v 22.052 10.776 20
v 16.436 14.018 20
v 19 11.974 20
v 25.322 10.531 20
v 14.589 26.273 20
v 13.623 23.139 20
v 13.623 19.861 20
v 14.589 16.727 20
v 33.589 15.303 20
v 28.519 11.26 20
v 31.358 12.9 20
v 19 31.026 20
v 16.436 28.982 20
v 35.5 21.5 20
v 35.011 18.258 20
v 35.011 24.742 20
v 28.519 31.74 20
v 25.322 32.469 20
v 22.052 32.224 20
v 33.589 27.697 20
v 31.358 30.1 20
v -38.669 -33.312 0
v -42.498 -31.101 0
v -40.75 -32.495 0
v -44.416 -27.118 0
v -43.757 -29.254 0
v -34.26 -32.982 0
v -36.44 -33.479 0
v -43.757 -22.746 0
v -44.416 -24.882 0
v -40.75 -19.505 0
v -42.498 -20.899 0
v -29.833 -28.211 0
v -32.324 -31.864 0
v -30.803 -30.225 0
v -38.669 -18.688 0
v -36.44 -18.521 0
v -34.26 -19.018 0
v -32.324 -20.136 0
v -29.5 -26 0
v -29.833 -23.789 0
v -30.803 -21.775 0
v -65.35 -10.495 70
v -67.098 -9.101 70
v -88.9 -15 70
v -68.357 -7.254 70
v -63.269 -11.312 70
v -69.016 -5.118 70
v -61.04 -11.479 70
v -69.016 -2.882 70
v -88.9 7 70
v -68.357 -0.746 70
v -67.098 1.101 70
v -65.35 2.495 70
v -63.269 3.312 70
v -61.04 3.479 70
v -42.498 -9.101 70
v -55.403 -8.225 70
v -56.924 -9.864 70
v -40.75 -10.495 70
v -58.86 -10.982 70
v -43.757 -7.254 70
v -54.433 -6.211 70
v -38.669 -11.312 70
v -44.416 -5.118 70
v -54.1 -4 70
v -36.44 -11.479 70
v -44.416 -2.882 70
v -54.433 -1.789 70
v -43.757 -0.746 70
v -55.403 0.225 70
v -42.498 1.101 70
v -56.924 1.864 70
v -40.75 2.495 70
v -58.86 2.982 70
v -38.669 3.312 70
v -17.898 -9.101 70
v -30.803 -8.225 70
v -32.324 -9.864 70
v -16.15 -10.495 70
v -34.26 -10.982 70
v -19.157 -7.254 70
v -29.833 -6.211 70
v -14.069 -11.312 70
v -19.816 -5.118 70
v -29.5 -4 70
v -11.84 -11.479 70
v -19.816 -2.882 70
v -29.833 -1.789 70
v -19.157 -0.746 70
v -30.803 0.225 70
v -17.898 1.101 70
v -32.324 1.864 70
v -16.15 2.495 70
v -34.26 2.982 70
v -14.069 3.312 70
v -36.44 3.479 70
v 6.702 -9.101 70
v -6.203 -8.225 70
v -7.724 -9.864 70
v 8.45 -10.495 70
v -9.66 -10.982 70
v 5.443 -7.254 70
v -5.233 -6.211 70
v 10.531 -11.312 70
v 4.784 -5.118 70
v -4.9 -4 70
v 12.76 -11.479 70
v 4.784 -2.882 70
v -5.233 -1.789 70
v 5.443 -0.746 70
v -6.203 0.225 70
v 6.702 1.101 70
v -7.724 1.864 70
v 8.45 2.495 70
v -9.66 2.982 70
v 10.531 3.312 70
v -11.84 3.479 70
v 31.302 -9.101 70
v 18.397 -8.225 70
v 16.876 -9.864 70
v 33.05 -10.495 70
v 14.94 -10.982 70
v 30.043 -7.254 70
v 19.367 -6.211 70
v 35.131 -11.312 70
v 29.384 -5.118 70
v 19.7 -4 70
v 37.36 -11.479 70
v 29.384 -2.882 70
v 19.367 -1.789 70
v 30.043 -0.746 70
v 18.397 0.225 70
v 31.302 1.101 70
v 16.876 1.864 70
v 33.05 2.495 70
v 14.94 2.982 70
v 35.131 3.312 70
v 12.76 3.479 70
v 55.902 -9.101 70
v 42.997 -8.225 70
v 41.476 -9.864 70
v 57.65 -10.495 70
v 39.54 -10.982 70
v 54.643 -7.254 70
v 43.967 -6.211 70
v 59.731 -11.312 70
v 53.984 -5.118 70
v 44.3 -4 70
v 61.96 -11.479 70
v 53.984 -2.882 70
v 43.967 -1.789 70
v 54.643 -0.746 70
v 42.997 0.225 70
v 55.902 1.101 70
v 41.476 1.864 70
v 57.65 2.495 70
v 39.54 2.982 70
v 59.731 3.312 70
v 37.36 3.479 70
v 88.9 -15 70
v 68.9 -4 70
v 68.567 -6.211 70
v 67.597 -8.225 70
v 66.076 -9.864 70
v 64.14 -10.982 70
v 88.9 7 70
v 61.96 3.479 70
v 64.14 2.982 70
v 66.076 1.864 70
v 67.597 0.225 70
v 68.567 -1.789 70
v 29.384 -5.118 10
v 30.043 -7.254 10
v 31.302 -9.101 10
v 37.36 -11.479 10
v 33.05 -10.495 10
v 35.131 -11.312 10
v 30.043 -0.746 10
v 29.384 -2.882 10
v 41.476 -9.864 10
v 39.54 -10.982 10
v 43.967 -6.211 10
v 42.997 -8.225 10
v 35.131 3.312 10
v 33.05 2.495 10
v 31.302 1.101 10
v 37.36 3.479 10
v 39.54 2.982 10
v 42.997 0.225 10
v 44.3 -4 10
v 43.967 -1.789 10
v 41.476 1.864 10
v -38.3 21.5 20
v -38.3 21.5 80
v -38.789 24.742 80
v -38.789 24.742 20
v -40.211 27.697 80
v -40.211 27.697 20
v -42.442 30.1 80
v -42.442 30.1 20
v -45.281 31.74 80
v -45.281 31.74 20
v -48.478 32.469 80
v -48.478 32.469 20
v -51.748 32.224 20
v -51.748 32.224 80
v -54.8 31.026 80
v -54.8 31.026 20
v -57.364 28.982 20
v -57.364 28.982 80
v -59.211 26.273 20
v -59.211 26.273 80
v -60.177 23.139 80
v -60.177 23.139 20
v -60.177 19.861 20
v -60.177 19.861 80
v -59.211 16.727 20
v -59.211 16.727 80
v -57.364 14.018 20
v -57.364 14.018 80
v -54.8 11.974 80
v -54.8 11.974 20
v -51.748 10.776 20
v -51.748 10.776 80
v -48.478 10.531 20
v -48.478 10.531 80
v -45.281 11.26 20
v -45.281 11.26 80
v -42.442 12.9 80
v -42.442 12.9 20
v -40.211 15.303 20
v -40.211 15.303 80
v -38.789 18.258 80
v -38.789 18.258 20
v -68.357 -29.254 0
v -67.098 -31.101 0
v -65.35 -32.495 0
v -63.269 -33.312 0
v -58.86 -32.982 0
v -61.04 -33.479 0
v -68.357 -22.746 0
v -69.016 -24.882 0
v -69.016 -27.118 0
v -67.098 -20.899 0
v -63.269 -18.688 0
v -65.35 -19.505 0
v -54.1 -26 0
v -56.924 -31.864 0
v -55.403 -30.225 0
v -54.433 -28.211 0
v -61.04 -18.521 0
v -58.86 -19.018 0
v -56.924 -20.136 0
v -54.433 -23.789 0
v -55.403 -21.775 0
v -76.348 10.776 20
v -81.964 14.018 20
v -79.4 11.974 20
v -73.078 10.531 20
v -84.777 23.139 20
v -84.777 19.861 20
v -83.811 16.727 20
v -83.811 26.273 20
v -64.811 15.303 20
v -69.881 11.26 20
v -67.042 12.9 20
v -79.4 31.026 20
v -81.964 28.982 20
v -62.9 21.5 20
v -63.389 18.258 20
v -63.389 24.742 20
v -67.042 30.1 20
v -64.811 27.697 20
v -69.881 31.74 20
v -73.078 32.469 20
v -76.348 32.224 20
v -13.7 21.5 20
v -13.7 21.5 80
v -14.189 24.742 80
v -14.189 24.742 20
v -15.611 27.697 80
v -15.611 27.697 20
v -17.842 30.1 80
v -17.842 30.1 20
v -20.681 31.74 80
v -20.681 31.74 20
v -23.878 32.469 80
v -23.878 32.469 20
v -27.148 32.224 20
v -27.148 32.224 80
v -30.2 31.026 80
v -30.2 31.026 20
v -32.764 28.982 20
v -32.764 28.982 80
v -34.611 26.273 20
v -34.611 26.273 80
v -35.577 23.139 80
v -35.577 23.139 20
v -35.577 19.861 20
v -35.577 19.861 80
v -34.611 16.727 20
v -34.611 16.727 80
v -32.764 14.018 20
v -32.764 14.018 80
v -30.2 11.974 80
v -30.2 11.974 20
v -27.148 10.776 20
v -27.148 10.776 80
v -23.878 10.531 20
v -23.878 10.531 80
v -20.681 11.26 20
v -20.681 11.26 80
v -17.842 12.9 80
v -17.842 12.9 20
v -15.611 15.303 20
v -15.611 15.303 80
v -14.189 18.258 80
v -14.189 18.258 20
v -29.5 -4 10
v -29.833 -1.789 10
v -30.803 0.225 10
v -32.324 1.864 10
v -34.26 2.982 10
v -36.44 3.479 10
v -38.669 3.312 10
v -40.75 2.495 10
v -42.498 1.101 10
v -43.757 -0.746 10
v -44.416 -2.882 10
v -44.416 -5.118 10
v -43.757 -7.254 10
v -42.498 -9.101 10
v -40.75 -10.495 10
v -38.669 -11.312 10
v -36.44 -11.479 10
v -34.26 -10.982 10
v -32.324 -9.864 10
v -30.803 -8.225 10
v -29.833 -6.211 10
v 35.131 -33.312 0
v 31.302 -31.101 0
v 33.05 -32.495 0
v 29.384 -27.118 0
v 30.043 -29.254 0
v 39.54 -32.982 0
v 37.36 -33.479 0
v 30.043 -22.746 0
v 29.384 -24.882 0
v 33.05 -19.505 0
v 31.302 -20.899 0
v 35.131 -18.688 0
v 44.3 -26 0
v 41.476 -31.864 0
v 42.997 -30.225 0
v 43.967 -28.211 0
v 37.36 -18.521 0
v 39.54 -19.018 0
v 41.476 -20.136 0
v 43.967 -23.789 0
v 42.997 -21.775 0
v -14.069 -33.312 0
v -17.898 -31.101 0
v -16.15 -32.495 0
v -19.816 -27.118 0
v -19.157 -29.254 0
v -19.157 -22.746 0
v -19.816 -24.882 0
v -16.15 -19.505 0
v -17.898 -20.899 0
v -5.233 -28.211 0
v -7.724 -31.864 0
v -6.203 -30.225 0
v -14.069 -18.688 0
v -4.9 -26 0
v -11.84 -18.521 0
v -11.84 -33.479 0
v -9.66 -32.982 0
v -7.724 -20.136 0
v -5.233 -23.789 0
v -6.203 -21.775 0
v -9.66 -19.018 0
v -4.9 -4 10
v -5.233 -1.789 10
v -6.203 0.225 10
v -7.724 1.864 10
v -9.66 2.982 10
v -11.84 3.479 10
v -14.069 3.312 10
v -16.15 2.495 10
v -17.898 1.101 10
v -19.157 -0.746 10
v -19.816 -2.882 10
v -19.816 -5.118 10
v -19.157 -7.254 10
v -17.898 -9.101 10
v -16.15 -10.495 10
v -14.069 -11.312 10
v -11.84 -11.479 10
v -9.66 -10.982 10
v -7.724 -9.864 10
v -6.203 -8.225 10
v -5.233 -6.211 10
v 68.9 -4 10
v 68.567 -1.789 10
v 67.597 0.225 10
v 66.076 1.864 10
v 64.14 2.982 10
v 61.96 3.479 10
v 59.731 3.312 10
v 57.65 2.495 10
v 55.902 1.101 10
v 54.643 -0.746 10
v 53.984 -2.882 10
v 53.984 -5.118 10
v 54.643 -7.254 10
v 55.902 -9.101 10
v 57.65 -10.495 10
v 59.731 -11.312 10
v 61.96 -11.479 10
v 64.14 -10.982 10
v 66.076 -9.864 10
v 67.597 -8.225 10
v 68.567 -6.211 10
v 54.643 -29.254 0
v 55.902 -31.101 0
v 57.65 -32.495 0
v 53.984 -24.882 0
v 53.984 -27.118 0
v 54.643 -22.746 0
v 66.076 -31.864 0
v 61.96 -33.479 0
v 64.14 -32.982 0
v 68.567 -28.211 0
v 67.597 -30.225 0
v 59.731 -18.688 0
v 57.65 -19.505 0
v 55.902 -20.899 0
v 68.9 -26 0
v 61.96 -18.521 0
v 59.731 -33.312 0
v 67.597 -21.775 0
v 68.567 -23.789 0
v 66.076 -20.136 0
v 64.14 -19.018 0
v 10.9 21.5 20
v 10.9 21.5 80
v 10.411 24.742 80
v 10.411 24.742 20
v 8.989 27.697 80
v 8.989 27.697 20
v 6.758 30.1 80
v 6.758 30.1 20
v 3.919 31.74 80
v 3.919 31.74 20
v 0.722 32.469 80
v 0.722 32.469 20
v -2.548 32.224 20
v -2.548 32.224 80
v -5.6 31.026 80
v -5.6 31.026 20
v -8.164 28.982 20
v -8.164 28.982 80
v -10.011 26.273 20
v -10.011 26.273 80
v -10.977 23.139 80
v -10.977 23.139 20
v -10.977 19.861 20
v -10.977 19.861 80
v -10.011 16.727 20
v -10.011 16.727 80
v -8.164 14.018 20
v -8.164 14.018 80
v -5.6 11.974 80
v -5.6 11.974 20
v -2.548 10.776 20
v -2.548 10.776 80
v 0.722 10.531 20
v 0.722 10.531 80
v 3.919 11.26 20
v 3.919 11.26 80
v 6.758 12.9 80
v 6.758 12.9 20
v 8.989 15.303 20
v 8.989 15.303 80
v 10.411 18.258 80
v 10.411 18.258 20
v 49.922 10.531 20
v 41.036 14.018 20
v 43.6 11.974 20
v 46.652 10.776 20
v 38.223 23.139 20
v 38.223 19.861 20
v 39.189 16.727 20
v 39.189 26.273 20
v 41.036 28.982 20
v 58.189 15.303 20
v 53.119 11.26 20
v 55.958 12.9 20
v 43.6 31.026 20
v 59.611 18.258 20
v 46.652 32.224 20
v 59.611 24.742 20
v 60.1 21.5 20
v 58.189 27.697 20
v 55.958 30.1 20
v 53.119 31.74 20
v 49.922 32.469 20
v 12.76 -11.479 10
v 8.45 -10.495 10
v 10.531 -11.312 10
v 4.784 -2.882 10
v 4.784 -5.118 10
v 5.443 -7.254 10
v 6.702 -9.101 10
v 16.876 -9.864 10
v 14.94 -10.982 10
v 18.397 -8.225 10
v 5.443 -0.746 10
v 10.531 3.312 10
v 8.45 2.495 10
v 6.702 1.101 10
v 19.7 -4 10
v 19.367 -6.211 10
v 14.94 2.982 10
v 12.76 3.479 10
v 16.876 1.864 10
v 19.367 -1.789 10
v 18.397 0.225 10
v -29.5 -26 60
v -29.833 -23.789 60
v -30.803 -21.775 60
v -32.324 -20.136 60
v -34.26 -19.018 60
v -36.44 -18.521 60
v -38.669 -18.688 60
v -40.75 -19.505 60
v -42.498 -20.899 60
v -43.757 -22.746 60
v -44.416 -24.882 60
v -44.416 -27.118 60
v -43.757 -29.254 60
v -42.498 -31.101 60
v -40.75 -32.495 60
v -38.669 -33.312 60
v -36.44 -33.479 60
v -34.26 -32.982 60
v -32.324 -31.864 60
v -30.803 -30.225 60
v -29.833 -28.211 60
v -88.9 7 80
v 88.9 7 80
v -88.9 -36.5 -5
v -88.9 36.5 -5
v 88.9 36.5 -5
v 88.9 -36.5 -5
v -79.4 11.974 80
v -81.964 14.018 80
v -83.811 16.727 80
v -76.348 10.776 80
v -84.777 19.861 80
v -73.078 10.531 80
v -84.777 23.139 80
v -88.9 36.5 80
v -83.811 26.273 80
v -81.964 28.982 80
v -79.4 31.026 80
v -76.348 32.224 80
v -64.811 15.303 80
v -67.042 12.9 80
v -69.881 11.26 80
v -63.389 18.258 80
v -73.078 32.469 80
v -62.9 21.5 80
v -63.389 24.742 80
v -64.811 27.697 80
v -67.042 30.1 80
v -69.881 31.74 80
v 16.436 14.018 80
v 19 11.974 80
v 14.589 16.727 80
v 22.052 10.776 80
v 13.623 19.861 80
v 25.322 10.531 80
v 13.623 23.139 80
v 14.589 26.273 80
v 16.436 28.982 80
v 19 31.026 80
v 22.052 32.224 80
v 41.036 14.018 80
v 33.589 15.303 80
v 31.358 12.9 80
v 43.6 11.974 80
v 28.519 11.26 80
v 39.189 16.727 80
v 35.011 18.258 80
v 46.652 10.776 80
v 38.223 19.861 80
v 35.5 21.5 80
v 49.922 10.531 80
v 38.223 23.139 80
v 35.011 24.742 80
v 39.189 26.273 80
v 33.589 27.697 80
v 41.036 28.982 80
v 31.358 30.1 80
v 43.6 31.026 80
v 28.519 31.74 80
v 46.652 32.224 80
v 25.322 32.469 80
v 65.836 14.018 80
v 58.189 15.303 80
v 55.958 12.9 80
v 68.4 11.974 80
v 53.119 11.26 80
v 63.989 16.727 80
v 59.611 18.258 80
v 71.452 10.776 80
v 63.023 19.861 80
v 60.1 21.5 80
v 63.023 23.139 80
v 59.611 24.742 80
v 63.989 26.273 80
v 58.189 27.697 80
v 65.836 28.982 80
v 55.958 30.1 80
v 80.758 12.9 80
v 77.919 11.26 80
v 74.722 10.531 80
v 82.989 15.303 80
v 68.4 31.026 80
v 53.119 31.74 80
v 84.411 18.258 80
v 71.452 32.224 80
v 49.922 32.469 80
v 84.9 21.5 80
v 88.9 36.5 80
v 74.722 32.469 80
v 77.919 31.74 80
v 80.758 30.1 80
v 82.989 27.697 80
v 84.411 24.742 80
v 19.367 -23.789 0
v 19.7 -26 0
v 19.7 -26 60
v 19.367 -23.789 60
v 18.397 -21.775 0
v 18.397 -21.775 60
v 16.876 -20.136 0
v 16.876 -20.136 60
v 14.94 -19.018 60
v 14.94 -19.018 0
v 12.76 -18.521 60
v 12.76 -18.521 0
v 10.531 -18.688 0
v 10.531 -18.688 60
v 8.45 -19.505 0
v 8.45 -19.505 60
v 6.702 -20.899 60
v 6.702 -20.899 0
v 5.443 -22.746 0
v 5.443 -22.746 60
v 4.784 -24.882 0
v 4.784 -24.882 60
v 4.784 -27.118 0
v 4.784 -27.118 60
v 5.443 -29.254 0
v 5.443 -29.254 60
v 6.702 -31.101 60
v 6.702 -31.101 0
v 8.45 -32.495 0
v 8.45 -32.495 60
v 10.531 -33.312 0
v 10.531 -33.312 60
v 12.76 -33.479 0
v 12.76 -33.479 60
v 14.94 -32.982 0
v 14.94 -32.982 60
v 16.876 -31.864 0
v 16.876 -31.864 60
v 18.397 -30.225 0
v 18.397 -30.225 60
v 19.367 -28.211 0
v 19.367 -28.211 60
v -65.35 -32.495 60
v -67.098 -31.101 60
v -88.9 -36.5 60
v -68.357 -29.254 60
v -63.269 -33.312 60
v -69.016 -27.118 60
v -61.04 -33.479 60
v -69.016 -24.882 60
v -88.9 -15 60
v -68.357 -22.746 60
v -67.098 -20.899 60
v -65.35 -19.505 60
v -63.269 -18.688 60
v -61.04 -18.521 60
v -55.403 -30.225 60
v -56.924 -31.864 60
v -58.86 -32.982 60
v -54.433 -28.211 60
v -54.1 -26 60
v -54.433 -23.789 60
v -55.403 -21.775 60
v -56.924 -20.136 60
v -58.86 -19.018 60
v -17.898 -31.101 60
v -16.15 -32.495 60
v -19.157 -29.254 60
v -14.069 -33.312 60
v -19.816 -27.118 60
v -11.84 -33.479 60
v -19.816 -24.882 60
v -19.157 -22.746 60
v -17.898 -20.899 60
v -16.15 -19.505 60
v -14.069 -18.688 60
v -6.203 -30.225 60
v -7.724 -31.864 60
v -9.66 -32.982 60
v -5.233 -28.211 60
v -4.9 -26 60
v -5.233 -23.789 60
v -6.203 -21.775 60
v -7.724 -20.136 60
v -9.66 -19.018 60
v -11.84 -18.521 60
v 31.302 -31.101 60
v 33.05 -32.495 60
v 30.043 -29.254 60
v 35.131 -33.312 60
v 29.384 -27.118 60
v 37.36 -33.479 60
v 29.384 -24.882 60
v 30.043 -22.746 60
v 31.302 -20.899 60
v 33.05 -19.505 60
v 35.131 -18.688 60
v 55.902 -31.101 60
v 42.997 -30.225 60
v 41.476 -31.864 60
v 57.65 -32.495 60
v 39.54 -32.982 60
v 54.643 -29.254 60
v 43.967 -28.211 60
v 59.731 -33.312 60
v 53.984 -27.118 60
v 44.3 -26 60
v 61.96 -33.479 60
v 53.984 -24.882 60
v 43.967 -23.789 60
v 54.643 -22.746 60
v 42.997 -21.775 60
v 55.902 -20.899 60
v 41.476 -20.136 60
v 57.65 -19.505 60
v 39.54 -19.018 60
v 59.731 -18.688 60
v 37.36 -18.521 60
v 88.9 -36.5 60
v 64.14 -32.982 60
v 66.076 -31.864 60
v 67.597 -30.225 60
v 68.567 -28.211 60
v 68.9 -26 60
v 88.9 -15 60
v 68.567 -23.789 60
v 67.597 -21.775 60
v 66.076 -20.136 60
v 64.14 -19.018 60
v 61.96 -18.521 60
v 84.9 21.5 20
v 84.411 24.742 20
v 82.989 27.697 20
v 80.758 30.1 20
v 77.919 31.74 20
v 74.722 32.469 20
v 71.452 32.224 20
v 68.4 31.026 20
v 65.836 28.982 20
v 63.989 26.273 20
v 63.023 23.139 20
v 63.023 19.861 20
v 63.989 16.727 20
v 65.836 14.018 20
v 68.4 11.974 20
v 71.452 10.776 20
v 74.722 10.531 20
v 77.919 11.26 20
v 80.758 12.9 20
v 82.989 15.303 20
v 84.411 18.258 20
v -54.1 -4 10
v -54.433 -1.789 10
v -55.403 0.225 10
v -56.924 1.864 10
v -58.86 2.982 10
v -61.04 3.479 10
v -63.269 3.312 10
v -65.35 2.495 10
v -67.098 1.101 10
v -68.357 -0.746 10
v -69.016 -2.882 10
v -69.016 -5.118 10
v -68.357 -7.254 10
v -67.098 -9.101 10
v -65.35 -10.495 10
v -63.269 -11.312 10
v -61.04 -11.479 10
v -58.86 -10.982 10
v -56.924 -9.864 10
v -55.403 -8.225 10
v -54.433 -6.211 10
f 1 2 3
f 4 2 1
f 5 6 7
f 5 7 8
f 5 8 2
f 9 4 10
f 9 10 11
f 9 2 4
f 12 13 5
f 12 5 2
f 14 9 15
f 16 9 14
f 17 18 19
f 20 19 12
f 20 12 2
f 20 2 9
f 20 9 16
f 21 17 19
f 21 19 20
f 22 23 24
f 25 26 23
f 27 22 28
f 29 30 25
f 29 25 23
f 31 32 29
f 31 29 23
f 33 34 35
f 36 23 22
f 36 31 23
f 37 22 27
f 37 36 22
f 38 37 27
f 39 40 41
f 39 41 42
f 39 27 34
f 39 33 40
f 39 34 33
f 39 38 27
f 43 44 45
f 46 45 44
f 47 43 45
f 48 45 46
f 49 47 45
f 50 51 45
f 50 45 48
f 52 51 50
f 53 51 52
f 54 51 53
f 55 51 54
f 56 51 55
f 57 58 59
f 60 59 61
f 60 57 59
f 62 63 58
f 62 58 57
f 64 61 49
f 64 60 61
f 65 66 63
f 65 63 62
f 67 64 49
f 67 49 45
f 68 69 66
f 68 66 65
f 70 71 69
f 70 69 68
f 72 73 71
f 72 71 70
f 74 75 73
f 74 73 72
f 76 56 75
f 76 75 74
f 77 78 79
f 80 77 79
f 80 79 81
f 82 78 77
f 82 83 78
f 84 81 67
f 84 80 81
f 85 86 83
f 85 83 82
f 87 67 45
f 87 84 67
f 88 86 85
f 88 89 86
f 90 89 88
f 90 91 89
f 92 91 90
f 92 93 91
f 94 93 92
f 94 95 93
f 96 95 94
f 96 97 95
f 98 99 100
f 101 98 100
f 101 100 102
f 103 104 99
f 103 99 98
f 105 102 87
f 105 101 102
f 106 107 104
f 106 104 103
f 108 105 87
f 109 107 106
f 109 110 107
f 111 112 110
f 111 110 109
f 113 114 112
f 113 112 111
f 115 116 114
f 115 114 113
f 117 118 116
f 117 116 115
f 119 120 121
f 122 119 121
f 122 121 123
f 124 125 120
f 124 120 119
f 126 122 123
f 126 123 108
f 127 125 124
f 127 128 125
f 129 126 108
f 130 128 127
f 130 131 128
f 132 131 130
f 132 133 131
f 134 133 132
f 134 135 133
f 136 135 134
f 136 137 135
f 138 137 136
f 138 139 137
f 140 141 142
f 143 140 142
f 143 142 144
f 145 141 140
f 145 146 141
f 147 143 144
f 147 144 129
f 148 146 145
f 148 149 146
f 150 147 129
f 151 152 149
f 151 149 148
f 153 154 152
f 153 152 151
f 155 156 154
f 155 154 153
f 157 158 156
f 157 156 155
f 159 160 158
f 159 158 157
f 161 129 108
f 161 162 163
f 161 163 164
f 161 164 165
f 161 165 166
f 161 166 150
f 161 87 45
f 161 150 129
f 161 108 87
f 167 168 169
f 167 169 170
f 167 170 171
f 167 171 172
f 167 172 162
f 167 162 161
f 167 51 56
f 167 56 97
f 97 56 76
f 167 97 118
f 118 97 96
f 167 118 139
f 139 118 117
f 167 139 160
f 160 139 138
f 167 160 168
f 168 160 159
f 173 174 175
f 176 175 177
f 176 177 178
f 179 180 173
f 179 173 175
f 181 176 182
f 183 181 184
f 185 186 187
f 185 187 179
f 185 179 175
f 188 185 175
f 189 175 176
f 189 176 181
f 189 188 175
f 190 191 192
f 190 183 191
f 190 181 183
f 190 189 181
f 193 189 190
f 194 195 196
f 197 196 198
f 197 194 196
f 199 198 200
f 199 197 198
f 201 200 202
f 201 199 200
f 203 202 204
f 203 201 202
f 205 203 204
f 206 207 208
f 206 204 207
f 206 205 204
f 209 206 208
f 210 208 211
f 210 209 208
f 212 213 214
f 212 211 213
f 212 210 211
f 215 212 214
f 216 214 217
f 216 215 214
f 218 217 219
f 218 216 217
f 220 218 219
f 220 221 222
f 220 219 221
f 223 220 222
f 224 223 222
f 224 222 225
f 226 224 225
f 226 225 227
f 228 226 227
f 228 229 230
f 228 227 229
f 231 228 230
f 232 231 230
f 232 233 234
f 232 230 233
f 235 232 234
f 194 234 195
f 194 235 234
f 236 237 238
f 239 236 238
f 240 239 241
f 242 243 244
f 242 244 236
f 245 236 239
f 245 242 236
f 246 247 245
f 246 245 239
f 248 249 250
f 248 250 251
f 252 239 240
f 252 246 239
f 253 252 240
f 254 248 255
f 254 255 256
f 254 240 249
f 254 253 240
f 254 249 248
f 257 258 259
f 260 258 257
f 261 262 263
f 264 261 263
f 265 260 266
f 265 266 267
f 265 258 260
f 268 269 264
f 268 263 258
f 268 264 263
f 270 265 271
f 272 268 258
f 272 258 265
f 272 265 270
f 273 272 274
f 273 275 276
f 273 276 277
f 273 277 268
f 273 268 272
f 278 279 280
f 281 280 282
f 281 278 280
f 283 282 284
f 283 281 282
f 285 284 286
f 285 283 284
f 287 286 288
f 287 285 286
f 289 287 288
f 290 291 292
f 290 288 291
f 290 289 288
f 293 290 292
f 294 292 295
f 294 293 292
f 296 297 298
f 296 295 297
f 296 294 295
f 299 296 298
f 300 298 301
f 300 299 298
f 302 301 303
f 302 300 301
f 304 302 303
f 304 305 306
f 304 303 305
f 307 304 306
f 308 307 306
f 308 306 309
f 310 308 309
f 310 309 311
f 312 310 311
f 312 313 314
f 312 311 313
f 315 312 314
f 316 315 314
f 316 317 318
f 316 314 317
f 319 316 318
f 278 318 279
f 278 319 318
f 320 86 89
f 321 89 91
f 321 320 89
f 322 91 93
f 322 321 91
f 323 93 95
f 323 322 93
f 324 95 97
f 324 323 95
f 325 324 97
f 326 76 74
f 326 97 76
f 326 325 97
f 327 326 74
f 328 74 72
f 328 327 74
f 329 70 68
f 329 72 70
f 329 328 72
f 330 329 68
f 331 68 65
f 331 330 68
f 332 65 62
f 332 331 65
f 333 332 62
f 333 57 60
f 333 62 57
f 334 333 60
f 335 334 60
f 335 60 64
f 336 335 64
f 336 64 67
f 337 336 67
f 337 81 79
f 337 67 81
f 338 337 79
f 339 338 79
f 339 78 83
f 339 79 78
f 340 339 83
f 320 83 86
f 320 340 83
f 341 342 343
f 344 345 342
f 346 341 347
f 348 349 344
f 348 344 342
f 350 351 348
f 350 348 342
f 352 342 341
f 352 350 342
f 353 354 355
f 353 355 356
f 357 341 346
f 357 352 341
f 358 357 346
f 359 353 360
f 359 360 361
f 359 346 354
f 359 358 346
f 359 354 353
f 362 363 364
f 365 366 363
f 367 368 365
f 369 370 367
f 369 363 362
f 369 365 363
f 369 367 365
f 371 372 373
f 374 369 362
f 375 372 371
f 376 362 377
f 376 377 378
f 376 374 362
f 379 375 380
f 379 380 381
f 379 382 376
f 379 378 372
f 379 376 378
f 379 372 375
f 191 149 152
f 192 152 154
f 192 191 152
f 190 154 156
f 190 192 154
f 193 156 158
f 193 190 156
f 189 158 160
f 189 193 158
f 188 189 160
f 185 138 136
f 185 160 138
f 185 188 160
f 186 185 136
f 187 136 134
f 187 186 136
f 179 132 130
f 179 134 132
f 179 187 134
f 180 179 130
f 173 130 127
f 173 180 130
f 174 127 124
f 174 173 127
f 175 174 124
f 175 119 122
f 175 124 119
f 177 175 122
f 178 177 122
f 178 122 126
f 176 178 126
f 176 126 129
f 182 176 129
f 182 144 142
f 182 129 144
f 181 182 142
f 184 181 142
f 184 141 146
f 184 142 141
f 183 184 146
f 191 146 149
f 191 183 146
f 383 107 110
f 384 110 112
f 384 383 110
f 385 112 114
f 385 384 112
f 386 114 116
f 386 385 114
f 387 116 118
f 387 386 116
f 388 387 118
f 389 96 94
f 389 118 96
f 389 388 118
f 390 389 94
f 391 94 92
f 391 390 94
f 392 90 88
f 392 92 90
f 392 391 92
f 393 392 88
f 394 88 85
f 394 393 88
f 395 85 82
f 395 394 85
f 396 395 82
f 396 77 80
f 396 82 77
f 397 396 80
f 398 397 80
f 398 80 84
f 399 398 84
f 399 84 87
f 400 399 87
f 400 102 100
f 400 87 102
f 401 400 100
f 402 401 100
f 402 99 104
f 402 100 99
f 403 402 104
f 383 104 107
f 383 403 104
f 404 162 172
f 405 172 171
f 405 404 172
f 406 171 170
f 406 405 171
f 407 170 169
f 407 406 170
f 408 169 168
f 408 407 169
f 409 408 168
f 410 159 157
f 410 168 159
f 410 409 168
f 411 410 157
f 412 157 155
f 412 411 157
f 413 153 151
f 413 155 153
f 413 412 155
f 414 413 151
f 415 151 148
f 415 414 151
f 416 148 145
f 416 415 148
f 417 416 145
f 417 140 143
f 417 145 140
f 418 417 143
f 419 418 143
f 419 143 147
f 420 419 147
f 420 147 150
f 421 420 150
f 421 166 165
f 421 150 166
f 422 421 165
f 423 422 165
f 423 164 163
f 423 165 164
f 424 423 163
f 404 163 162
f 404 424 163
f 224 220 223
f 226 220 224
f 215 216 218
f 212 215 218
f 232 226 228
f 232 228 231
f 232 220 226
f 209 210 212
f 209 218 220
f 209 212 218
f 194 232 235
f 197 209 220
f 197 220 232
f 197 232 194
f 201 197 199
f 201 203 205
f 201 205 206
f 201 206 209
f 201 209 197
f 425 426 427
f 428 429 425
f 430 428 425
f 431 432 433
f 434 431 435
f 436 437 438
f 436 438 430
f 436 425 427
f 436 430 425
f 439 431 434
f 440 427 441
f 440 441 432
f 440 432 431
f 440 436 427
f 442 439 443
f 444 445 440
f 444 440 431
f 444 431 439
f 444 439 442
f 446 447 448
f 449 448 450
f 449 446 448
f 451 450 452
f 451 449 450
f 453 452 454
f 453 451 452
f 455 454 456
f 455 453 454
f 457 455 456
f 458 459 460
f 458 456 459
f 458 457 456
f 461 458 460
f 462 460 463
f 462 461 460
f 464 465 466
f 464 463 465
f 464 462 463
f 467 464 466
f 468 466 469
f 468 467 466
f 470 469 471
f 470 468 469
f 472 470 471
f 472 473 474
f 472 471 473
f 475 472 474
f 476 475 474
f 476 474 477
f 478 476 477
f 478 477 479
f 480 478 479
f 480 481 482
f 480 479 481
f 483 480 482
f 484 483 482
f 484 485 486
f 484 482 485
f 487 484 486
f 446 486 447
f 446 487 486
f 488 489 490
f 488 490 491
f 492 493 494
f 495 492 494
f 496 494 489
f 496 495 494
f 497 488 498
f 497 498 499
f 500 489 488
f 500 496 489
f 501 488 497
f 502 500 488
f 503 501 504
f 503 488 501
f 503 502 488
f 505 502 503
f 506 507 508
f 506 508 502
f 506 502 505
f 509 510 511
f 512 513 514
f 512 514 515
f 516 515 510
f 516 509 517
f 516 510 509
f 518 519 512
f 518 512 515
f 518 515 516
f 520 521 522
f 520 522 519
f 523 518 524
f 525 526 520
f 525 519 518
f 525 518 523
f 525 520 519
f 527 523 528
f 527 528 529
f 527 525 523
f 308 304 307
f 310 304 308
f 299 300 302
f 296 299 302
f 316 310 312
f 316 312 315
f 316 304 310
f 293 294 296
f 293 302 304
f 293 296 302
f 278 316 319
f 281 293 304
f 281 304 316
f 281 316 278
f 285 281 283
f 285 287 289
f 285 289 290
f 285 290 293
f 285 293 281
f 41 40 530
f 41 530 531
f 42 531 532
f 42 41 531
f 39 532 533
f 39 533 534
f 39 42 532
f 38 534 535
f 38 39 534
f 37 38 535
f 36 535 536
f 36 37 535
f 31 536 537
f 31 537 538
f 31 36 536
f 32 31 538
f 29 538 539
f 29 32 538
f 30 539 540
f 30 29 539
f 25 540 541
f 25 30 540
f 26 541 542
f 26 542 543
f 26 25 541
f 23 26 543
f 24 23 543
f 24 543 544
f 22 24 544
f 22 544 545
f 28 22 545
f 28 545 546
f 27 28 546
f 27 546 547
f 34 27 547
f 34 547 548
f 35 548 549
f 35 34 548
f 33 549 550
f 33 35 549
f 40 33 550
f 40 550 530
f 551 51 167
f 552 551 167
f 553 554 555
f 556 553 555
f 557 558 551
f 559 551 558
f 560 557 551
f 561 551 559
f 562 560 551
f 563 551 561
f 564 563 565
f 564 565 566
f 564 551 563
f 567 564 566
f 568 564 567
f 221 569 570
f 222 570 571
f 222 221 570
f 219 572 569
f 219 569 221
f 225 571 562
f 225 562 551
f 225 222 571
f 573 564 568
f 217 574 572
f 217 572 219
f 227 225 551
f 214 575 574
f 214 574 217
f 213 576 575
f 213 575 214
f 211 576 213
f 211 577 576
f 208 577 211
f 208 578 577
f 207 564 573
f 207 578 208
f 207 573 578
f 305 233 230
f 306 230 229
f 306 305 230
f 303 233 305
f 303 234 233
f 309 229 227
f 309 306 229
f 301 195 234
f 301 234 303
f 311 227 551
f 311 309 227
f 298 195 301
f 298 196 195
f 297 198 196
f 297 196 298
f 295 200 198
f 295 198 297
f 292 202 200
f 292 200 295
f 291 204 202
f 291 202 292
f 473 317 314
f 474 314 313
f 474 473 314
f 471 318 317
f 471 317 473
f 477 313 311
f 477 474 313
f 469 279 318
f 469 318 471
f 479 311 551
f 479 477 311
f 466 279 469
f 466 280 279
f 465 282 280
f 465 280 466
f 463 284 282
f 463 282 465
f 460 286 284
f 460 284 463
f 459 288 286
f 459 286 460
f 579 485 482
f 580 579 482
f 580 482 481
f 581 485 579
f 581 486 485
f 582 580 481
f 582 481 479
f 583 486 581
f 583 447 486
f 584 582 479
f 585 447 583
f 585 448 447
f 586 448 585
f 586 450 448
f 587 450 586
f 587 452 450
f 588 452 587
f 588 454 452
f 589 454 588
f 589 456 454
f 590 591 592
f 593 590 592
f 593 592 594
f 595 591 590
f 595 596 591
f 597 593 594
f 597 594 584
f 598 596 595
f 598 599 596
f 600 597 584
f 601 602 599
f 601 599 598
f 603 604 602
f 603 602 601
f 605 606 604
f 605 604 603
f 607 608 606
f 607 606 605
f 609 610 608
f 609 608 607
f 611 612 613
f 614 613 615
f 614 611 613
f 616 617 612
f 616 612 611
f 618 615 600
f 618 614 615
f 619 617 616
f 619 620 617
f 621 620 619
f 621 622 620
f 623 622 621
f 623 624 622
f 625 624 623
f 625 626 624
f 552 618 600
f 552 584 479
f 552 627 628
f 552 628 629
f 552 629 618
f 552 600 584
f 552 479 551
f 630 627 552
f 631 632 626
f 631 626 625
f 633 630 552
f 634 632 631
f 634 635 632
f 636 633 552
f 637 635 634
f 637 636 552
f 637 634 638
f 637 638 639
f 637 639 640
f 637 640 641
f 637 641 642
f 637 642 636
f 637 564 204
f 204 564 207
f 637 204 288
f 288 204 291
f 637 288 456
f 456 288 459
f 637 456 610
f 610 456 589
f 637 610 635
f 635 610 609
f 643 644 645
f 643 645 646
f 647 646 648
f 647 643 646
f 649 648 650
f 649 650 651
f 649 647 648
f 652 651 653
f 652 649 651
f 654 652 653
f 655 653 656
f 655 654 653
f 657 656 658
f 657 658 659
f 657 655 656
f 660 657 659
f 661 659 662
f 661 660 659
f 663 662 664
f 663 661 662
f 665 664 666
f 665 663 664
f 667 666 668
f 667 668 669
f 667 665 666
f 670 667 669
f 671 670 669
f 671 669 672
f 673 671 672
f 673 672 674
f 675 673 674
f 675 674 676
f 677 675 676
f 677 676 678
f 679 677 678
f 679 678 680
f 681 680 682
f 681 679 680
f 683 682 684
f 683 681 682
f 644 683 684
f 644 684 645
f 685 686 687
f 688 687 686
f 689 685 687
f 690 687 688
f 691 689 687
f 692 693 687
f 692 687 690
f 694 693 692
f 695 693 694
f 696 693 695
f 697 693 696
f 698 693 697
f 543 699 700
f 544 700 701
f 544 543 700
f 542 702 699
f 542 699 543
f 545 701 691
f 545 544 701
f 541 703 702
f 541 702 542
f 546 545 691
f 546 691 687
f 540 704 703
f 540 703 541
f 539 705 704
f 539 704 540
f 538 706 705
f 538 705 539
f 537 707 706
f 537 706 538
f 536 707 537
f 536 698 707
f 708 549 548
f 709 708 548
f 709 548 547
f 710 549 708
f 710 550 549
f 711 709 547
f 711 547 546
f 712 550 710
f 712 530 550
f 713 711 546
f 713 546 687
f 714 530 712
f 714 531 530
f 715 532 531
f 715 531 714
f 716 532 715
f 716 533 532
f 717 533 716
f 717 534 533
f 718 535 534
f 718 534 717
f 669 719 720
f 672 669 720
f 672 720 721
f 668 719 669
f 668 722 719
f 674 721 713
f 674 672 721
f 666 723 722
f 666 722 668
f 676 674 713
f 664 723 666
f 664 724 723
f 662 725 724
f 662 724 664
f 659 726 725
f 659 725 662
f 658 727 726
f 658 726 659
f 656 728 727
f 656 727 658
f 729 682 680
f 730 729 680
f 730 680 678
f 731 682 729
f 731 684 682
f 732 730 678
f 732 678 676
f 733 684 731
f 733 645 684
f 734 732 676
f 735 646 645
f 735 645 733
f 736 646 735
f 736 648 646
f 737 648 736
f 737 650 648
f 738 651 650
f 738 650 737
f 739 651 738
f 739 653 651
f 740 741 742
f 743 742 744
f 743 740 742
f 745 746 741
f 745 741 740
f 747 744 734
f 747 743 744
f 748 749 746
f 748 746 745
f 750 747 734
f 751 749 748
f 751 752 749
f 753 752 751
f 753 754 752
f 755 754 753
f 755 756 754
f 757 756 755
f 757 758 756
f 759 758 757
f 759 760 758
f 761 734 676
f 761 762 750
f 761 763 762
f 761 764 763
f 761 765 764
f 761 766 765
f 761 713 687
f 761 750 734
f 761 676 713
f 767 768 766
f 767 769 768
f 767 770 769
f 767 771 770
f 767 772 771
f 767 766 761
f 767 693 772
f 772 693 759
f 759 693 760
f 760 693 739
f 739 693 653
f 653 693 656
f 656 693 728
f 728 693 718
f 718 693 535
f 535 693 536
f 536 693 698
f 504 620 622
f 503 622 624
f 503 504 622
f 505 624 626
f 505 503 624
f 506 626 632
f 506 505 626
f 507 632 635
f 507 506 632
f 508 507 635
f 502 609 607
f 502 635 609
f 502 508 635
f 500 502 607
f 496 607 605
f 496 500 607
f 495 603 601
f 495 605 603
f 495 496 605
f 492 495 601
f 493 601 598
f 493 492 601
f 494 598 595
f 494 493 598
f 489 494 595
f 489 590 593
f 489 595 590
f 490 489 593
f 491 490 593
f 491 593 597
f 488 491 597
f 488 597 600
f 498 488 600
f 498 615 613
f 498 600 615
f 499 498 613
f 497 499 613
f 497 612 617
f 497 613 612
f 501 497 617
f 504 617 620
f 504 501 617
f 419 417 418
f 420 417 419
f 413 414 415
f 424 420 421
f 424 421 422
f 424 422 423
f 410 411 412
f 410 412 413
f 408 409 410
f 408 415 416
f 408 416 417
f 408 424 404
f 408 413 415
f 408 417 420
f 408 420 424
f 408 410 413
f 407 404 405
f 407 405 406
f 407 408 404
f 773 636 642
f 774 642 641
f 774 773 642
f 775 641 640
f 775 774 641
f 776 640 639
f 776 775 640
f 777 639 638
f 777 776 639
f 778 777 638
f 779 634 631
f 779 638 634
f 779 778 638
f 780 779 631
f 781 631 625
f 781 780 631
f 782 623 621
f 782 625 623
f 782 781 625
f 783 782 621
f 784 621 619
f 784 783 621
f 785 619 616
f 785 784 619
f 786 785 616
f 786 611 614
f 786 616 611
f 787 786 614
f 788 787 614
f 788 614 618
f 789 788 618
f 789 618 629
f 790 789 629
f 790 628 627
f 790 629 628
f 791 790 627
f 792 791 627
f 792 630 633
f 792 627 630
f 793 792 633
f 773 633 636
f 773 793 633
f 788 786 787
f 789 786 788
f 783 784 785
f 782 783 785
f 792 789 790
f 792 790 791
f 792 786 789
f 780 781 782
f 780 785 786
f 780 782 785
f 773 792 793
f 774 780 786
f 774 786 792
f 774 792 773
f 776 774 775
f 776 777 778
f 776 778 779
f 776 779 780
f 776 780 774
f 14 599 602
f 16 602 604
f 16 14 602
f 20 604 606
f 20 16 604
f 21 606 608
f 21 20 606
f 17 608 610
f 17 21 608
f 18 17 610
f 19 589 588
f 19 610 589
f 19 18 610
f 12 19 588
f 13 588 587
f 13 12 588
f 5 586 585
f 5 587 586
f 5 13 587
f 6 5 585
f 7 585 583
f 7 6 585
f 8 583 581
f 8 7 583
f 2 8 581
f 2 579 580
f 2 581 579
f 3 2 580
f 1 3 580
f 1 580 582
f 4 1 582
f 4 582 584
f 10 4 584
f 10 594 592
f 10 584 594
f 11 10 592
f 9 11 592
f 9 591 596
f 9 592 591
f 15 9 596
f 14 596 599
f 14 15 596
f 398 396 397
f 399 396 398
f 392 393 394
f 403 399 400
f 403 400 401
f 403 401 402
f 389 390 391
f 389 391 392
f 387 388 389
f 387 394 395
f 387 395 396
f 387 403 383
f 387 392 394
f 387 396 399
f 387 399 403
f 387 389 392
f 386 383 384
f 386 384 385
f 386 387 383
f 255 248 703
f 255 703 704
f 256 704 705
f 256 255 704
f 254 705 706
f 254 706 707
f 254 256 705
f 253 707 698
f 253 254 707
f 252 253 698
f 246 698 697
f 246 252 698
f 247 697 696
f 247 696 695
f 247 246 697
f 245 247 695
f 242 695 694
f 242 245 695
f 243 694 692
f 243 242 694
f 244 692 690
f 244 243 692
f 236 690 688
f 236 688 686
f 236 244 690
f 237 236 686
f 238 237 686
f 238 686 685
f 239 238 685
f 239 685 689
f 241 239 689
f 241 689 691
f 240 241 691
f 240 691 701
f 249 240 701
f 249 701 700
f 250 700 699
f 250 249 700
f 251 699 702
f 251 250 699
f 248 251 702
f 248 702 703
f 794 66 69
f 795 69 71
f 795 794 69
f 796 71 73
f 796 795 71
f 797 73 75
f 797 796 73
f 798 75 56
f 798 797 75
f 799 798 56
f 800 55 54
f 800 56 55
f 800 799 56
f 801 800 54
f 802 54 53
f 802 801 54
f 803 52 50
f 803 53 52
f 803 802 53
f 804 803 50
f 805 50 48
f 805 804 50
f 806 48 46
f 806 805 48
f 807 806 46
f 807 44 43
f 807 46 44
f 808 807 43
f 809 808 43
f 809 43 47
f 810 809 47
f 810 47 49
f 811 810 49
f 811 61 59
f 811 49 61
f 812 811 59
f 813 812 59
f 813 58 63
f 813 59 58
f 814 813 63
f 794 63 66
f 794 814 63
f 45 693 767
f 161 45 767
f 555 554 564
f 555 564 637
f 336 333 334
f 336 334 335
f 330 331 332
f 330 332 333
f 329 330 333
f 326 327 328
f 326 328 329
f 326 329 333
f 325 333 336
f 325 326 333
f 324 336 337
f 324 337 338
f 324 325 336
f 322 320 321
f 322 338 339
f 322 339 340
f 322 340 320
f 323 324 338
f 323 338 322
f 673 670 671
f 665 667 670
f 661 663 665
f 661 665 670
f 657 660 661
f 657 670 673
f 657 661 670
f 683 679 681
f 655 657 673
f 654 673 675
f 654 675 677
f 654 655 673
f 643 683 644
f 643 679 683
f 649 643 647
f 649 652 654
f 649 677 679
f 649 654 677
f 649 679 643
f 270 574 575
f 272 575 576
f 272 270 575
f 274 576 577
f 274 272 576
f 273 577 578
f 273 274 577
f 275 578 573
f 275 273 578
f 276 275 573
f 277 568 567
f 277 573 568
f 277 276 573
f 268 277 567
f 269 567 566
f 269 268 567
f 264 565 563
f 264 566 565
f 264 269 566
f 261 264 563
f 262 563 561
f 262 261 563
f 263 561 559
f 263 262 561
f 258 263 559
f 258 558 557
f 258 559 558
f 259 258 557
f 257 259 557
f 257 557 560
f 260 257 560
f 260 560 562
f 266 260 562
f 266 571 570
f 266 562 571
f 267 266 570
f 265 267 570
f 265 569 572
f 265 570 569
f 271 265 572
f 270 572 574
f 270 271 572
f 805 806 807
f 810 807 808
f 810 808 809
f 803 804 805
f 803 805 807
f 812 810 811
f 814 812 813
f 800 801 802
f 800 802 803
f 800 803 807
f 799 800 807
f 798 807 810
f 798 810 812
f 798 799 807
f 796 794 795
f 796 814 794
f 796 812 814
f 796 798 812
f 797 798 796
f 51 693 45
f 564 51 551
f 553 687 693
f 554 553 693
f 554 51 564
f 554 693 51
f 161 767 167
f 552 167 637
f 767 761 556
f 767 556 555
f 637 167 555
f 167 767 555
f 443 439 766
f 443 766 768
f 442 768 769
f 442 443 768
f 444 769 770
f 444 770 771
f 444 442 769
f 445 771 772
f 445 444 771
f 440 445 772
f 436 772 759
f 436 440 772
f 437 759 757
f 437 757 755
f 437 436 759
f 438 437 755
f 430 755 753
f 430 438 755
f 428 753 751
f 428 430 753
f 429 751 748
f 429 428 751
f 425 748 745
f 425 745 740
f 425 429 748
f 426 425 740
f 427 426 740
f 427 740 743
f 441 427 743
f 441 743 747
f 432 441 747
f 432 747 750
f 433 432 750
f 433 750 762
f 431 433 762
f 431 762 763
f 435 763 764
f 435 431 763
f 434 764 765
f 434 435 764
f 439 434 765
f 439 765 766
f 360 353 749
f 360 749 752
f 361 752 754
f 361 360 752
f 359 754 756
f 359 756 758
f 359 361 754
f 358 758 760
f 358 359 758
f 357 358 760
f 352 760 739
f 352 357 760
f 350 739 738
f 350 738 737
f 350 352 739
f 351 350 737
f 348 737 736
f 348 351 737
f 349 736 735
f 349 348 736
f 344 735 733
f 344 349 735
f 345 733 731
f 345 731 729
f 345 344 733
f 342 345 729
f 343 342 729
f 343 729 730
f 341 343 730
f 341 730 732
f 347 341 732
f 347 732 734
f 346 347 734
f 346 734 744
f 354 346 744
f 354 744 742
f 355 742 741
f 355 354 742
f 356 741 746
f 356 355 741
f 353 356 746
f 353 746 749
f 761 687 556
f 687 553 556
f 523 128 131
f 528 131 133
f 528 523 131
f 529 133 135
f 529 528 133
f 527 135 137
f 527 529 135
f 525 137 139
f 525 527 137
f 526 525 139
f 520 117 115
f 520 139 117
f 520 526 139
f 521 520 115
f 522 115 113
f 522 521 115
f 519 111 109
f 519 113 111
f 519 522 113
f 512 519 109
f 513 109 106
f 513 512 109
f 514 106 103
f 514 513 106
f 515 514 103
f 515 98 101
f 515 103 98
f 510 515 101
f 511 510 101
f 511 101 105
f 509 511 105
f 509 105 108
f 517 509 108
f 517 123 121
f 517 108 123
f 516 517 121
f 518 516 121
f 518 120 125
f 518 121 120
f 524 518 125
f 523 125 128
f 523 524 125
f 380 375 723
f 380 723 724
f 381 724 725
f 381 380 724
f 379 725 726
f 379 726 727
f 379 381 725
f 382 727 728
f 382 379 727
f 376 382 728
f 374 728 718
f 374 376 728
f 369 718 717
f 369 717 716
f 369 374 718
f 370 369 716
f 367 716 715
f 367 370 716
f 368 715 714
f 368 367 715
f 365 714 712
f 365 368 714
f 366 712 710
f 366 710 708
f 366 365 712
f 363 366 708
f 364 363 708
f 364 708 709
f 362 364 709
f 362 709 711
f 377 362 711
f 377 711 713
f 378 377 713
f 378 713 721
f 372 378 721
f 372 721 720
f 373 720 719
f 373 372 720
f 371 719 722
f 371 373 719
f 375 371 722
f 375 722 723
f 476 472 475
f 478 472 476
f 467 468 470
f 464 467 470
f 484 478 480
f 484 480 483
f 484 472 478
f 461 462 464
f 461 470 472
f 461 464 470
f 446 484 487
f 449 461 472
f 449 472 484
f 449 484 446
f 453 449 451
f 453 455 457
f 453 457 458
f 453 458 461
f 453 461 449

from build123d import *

# Parameters (mm, degrees)
F0_W     = 177.8
F0_H     = 29.5
F0_R     = 11
F0_H_2   = 22
F0_R_2   = 7.5
F0_H_3   = 21.5
F1_DEPTH = 5
F2_DEPTH = 60
F3_DEPTH = 70
F4_DEPTH = 70
F7_DEPTH = 80
F8_DEPTH = 90


with BuildPart() as f1:
    # F0 (on Top) → F1 (new body)
    with BuildSketch(Plane.XY):
        with Locations((0, 21.75)):
            Rectangle(F0_W, F0_H)
        with Locations((-73.9, 21.5)):
            Circle(F0_R, mode=Mode.SUBTRACT)
        with Locations((-49.3, 21.5)):
            Circle(F0_R, mode=Mode.SUBTRACT)
        with Locations((-24.7, 21.5)):
            Circle(F0_R, mode=Mode.SUBTRACT)
        with Locations((-0.1, 21.5)):
            Circle(F0_R, mode=Mode.SUBTRACT)
        with Locations((24.5, 21.5)):
            Circle(F0_R, mode=Mode.SUBTRACT)
        with Locations((49.1, 21.5)):
            Circle(F0_R, mode=Mode.SUBTRACT)
        with Locations((73.9, 21.5)):
            Circle(F0_R, mode=Mode.SUBTRACT)
        with Locations((0, -4)):
            Rectangle(F0_W, F0_H_2)
        with Locations((-61.6, -4)):
            Circle(F0_R_2, mode=Mode.SUBTRACT)
        with Locations((-37, -4)):
            Circle(F0_R_2, mode=Mode.SUBTRACT)
        with Locations((-12.4, -4)):
            Circle(F0_R_2, mode=Mode.SUBTRACT)
        with Locations((12.2, -4)):
            Circle(F0_R_2, mode=Mode.SUBTRACT)
        with Locations((36.8, -4)):
            Circle(F0_R_2, mode=Mode.SUBTRACT)
        with Locations((61.4, -4)):
            Circle(F0_R_2, mode=Mode.SUBTRACT)
        with Locations((0, -25.75)):
            Rectangle(F0_W, F0_H_3)
        with Locations((-61.6, -26)):
            Circle(F0_R_2, mode=Mode.SUBTRACT)
        with Locations((-37, -26)):
            Circle(F0_R_2, mode=Mode.SUBTRACT)
        with Locations((-12.4, -26)):
            Circle(F0_R_2, mode=Mode.SUBTRACT)
        with Locations((12.2, -26)):
            Circle(F0_R_2, mode=Mode.SUBTRACT)
        with Locations((36.8, -26)):
            Circle(F0_R_2, mode=Mode.SUBTRACT)
        with Locations((61.4, -26)):
            Circle(F0_R_2, mode=Mode.SUBTRACT)
        with Locations((-24.7, 21.5)):
            Circle(F0_R)
        with Locations((-49.3, 21.5)):
            Circle(F0_R)
        with Locations((-73.9, 21.5)):
            Circle(F0_R)
        with Locations((24.5, 21.5)):
            Circle(F0_R)
        with Locations((73.9, 21.5)):
            Circle(F0_R)
        with Locations((49.1, 21.5)):
            Circle(F0_R)
        with Locations((-0.1, 21.5)):
            Circle(F0_R)
        with Locations((36.8, -4)):
            Circle(F0_R_2)
        with Locations((12.2, -26)):
            Circle(F0_R_2)
        with Locations((-12.4, -4)):
            Circle(F0_R_2)
        with Locations((-12.4, -26)):
            Circle(F0_R_2)
        with Locations((12.2, -4)):
            Circle(F0_R_2)
        with Locations((61.4, -4)):
            Circle(F0_R_2)
        with Locations((-37, -4)):
            Circle(F0_R_2)
        with Locations((-61.6, -4)):
            Circle(F0_R_2)
        with Locations((-37, -26)):
            Circle(F0_R_2)
        with Locations((-61.6, -26)):
            Circle(F0_R_2)
        with Locations((61.4, -26)):
            Circle(F0_R_2)
        with Locations((36.8, -26)):
            Circle(F0_R_2)
    extrude(amount=-F1_DEPTH)

    # F0 (on Top) → F2 (join)
    with BuildSketch(Plane.XY):
        with Locations((0, -25.75)):
            Rectangle(F0_W, F0_H_3)
        with Locations((-61.6, -26)):
            Circle(F0_R_2, mode=Mode.SUBTRACT)
        with Locations((-37, -26)):
            Circle(F0_R_2, mode=Mode.SUBTRACT)
        with Locations((-12.4, -26)):
            Circle(F0_R_2, mode=Mode.SUBTRACT)
        with Locations((12.2, -26)):
            Circle(F0_R_2, mode=Mode.SUBTRACT)
        with Locations((36.8, -26)):
            Circle(F0_R_2, mode=Mode.SUBTRACT)
        with Locations((61.4, -26)):
            Circle(F0_R_2, mode=Mode.SUBTRACT)
    extrude(amount=F2_DEPTH)

    # F0 (on Top) → F3 (join)
    with BuildSketch(Plane.XY):
        with Locations((0, -4)):
            Rectangle(F0_W, F0_H_2)
        with Locations((-61.6, -4)):
            Circle(F0_R_2, mode=Mode.SUBTRACT)
        with Locations((-37, -4)):
            Circle(F0_R_2, mode=Mode.SUBTRACT)
        with Locations((-12.4, -4)):
            Circle(F0_R_2, mode=Mode.SUBTRACT)
        with Locations((12.2, -4)):
            Circle(F0_R_2, mode=Mode.SUBTRACT)
        with Locations((36.8, -4)):
            Circle(F0_R_2, mode=Mode.SUBTRACT)
        with Locations((61.4, -4)):
            Circle(F0_R_2, mode=Mode.SUBTRACT)
        with Locations((-61.6, -4)):
            Circle(F0_R_2)
        with Locations((-37, -4)):
            Circle(F0_R_2)
        with Locations((-12.4, -4)):
            Circle(F0_R_2)
        with Locations((12.2, -4)):
            Circle(F0_R_2)
        with Locations((36.8, -4)):
            Circle(F0_R_2)
        with Locations((61.4, -4)):
            Circle(F0_R_2)
    extrude(amount=F3_DEPTH)


with BuildPart() as f4:
    # F0 (on Top) → F4 (new body)
    with BuildSketch(Plane.XY):
        with Locations((-61.6, -4)):
            Circle(F0_R_2)
    extrude(amount=F4_DEPTH)


with BuildPart() as f4b:
    # F0 (on Top) → F4, piece 2 (new body)
    with BuildSketch(Plane.XY):
        with Locations((-37, -4)):
            Circle(F0_R_2)
    extrude(amount=F4_DEPTH)


with BuildPart() as f4c:
    # F0 (on Top) → F4, piece 3 (new body)
    with BuildSketch(Plane.XY):
        with Locations((-12.4, -4)):
            Circle(F0_R_2)
    extrude(amount=F4_DEPTH)


with BuildPart() as f4d:
    # F0 (on Top) → F4, piece 4 (new body)
    with BuildSketch(Plane.XY):
        with Locations((12.2, -4)):
            Circle(F0_R_2)
    extrude(amount=F4_DEPTH)


with BuildPart() as f4e:
    # F0 (on Top) → F4, piece 5 (new body)
    with BuildSketch(Plane.XY):
        with Locations((36.8, -4)):
            Circle(F0_R_2)
    extrude(amount=F4_DEPTH)


with BuildPart() as f4f:
    # F0 (on Top) → F4, piece 6 (new body)
    with BuildSketch(Plane.XY):
        with Locations((61.4, -4)):
            Circle(F0_R_2)
    extrude(amount=F4_DEPTH)


with BuildPart() as f4_1:
    # F5: moved
    add(f4.part.moved(Location((0, 0, 10))))


with BuildPart() as f4b_1:
    # F5: moved
    add(f4b.part.moved(Location((0, 0, 10))))


with BuildPart() as f4c_1:
    # F5: moved
    add(f4c.part.moved(Location((0, 0, 10))))


with BuildPart() as f4d_1:
    # F5: moved
    add(f4d.part.moved(Location((0, 0, 10))))


with BuildPart() as f4e_1:
    # F5: moved
    add(f4e.part.moved(Location((0, 0, 10))))


with BuildPart() as f4f_1:
    # F5: moved
    add(f4f.part.moved(Location((0, 0, 10))))


with BuildPart() as f1_1:
    add(f1.part)

    # F6: cut F4, F4b, F4c, F4d, F4e, F4f
    add(f4_1.part, mode=Mode.SUBTRACT)
    add(f4b_1.part, mode=Mode.SUBTRACT)
    add(f4c_1.part, mode=Mode.SUBTRACT)
    add(f4d_1.part, mode=Mode.SUBTRACT)
    add(f4e_1.part, mode=Mode.SUBTRACT)
    add(f4f_1.part, mode=Mode.SUBTRACT)

    # F0 (on Top) → F7 (join)
    with BuildSketch(Plane.XY):
        with Locations((0, 21.75)):
            Rectangle(F0_W, F0_H)
        with Locations((-73.9, 21.5)):
            Circle(F0_R, mode=Mode.SUBTRACT)
        with Locations((-49.3, 21.5)):
            Circle(F0_R, mode=Mode.SUBTRACT)
        with Locations((-24.7, 21.5)):
            Circle(F0_R, mode=Mode.SUBTRACT)
        with Locations((-0.1, 21.5)):
            Circle(F0_R, mode=Mode.SUBTRACT)
        with Locations((24.5, 21.5)):
            Circle(F0_R, mode=Mode.SUBTRACT)
        with Locations((49.1, 21.5)):
            Circle(F0_R, mode=Mode.SUBTRACT)
        with Locations((73.9, 21.5)):
            Circle(F0_R, mode=Mode.SUBTRACT)
        with Locations((-73.9, 21.5)):
            Circle(F0_R)
        with Locations((-49.3, 21.5)):
            Circle(F0_R)
        with Locations((-24.7, 21.5)):
            Circle(F0_R)
        with Locations((-0.1, 21.5)):
            Circle(F0_R)
        with Locations((24.5, 21.5)):
            Circle(F0_R)
        with Locations((49.1, 21.5)):
            Circle(F0_R)
        with Locations((73.9, 21.5)):
            Circle(F0_R)
    extrude(amount=F7_DEPTH)


with BuildPart() as f8:
    # F0 (on Top) → F8 (new body)
    with BuildSketch(Plane.XY):
        with Locations((-73.9, 21.5)):
            Circle(F0_R)
    extrude(amount=F8_DEPTH)


with BuildPart() as f8b:
    # F0 (on Top) → F8, piece 2 (new body)
    with BuildSketch(Plane.XY):
        with Locations((-49.3, 21.5)):
            Circle(F0_R)
    extrude(amount=F8_DEPTH)


with BuildPart() as f8c:
    # F0 (on Top) → F8, piece 3 (new body)
    with BuildSketch(Plane.XY):
        with Locations((-24.7, 21.5)):
            Circle(F0_R)
    extrude(amount=F8_DEPTH)


with BuildPart() as f8d:
    # F0 (on Top) → F8, piece 4 (new body)
    with BuildSketch(Plane.XY):
        with Locations((-0.1, 21.5)):
            Circle(F0_R)
    extrude(amount=F8_DEPTH)


with BuildPart() as f8e:
    # F0 (on Top) → F8, piece 5 (new body)
    with BuildSketch(Plane.XY):
        with Locations((24.5, 21.5)):
            Circle(F0_R)
    extrude(amount=F8_DEPTH)


with BuildPart() as f8f:
    # F0 (on Top) → F8, piece 6 (new body)
    with BuildSketch(Plane.XY):
        with Locations((49.1, 21.5)):
            Circle(F0_R)
    extrude(amount=F8_DEPTH)


with BuildPart() as f8g:
    # F0 (on Top) → F8, piece 7 (new body)
    with BuildSketch(Plane.XY):
        with Locations((73.9, 21.5)):
            Circle(F0_R)
    extrude(amount=F8_DEPTH)


with BuildPart() as f8_1:
    # F9: moved
    add(f8.part.moved(Location((0, 0, 20))))


with BuildPart() as f8g_1:
    # F9: moved
    add(f8g.part.moved(Location((0, 0, 20))))


with BuildPart() as f8b_1:
    # F9: moved
    add(f8b.part.moved(Location((0, 0, 20))))


with BuildPart() as f8c_1:
    # F9: moved
    add(f8c.part.moved(Location((0, 0, 20))))


with BuildPart() as f8d_1:
    # F9: moved
    add(f8d.part.moved(Location((0, 0, 20))))


with BuildPart() as f8e_1:
    # F9: moved
    add(f8e.part.moved(Location((0, 0, 20))))


with BuildPart() as f8f_1:
    # F9: moved
    add(f8f.part.moved(Location((0, 0, 20))))


with BuildPart() as f1_2:
    add(f1_1.part)

    # F10: cut F8, F8g, F8b, F8c, F8d, F8e, F8f
    add(f8_1.part, mode=Mode.SUBTRACT)
    add(f8g_1.part, mode=Mode.SUBTRACT)
    add(f8b_1.part, mode=Mode.SUBTRACT)
    add(f8c_1.part, mode=Mode.SUBTRACT)
    add(f8d_1.part, mode=Mode.SUBTRACT)
    add(f8e_1.part, mode=Mode.SUBTRACT)
    add(f8f_1.part, mode=Mode.SUBTRACT)


solid = f1_2.part
